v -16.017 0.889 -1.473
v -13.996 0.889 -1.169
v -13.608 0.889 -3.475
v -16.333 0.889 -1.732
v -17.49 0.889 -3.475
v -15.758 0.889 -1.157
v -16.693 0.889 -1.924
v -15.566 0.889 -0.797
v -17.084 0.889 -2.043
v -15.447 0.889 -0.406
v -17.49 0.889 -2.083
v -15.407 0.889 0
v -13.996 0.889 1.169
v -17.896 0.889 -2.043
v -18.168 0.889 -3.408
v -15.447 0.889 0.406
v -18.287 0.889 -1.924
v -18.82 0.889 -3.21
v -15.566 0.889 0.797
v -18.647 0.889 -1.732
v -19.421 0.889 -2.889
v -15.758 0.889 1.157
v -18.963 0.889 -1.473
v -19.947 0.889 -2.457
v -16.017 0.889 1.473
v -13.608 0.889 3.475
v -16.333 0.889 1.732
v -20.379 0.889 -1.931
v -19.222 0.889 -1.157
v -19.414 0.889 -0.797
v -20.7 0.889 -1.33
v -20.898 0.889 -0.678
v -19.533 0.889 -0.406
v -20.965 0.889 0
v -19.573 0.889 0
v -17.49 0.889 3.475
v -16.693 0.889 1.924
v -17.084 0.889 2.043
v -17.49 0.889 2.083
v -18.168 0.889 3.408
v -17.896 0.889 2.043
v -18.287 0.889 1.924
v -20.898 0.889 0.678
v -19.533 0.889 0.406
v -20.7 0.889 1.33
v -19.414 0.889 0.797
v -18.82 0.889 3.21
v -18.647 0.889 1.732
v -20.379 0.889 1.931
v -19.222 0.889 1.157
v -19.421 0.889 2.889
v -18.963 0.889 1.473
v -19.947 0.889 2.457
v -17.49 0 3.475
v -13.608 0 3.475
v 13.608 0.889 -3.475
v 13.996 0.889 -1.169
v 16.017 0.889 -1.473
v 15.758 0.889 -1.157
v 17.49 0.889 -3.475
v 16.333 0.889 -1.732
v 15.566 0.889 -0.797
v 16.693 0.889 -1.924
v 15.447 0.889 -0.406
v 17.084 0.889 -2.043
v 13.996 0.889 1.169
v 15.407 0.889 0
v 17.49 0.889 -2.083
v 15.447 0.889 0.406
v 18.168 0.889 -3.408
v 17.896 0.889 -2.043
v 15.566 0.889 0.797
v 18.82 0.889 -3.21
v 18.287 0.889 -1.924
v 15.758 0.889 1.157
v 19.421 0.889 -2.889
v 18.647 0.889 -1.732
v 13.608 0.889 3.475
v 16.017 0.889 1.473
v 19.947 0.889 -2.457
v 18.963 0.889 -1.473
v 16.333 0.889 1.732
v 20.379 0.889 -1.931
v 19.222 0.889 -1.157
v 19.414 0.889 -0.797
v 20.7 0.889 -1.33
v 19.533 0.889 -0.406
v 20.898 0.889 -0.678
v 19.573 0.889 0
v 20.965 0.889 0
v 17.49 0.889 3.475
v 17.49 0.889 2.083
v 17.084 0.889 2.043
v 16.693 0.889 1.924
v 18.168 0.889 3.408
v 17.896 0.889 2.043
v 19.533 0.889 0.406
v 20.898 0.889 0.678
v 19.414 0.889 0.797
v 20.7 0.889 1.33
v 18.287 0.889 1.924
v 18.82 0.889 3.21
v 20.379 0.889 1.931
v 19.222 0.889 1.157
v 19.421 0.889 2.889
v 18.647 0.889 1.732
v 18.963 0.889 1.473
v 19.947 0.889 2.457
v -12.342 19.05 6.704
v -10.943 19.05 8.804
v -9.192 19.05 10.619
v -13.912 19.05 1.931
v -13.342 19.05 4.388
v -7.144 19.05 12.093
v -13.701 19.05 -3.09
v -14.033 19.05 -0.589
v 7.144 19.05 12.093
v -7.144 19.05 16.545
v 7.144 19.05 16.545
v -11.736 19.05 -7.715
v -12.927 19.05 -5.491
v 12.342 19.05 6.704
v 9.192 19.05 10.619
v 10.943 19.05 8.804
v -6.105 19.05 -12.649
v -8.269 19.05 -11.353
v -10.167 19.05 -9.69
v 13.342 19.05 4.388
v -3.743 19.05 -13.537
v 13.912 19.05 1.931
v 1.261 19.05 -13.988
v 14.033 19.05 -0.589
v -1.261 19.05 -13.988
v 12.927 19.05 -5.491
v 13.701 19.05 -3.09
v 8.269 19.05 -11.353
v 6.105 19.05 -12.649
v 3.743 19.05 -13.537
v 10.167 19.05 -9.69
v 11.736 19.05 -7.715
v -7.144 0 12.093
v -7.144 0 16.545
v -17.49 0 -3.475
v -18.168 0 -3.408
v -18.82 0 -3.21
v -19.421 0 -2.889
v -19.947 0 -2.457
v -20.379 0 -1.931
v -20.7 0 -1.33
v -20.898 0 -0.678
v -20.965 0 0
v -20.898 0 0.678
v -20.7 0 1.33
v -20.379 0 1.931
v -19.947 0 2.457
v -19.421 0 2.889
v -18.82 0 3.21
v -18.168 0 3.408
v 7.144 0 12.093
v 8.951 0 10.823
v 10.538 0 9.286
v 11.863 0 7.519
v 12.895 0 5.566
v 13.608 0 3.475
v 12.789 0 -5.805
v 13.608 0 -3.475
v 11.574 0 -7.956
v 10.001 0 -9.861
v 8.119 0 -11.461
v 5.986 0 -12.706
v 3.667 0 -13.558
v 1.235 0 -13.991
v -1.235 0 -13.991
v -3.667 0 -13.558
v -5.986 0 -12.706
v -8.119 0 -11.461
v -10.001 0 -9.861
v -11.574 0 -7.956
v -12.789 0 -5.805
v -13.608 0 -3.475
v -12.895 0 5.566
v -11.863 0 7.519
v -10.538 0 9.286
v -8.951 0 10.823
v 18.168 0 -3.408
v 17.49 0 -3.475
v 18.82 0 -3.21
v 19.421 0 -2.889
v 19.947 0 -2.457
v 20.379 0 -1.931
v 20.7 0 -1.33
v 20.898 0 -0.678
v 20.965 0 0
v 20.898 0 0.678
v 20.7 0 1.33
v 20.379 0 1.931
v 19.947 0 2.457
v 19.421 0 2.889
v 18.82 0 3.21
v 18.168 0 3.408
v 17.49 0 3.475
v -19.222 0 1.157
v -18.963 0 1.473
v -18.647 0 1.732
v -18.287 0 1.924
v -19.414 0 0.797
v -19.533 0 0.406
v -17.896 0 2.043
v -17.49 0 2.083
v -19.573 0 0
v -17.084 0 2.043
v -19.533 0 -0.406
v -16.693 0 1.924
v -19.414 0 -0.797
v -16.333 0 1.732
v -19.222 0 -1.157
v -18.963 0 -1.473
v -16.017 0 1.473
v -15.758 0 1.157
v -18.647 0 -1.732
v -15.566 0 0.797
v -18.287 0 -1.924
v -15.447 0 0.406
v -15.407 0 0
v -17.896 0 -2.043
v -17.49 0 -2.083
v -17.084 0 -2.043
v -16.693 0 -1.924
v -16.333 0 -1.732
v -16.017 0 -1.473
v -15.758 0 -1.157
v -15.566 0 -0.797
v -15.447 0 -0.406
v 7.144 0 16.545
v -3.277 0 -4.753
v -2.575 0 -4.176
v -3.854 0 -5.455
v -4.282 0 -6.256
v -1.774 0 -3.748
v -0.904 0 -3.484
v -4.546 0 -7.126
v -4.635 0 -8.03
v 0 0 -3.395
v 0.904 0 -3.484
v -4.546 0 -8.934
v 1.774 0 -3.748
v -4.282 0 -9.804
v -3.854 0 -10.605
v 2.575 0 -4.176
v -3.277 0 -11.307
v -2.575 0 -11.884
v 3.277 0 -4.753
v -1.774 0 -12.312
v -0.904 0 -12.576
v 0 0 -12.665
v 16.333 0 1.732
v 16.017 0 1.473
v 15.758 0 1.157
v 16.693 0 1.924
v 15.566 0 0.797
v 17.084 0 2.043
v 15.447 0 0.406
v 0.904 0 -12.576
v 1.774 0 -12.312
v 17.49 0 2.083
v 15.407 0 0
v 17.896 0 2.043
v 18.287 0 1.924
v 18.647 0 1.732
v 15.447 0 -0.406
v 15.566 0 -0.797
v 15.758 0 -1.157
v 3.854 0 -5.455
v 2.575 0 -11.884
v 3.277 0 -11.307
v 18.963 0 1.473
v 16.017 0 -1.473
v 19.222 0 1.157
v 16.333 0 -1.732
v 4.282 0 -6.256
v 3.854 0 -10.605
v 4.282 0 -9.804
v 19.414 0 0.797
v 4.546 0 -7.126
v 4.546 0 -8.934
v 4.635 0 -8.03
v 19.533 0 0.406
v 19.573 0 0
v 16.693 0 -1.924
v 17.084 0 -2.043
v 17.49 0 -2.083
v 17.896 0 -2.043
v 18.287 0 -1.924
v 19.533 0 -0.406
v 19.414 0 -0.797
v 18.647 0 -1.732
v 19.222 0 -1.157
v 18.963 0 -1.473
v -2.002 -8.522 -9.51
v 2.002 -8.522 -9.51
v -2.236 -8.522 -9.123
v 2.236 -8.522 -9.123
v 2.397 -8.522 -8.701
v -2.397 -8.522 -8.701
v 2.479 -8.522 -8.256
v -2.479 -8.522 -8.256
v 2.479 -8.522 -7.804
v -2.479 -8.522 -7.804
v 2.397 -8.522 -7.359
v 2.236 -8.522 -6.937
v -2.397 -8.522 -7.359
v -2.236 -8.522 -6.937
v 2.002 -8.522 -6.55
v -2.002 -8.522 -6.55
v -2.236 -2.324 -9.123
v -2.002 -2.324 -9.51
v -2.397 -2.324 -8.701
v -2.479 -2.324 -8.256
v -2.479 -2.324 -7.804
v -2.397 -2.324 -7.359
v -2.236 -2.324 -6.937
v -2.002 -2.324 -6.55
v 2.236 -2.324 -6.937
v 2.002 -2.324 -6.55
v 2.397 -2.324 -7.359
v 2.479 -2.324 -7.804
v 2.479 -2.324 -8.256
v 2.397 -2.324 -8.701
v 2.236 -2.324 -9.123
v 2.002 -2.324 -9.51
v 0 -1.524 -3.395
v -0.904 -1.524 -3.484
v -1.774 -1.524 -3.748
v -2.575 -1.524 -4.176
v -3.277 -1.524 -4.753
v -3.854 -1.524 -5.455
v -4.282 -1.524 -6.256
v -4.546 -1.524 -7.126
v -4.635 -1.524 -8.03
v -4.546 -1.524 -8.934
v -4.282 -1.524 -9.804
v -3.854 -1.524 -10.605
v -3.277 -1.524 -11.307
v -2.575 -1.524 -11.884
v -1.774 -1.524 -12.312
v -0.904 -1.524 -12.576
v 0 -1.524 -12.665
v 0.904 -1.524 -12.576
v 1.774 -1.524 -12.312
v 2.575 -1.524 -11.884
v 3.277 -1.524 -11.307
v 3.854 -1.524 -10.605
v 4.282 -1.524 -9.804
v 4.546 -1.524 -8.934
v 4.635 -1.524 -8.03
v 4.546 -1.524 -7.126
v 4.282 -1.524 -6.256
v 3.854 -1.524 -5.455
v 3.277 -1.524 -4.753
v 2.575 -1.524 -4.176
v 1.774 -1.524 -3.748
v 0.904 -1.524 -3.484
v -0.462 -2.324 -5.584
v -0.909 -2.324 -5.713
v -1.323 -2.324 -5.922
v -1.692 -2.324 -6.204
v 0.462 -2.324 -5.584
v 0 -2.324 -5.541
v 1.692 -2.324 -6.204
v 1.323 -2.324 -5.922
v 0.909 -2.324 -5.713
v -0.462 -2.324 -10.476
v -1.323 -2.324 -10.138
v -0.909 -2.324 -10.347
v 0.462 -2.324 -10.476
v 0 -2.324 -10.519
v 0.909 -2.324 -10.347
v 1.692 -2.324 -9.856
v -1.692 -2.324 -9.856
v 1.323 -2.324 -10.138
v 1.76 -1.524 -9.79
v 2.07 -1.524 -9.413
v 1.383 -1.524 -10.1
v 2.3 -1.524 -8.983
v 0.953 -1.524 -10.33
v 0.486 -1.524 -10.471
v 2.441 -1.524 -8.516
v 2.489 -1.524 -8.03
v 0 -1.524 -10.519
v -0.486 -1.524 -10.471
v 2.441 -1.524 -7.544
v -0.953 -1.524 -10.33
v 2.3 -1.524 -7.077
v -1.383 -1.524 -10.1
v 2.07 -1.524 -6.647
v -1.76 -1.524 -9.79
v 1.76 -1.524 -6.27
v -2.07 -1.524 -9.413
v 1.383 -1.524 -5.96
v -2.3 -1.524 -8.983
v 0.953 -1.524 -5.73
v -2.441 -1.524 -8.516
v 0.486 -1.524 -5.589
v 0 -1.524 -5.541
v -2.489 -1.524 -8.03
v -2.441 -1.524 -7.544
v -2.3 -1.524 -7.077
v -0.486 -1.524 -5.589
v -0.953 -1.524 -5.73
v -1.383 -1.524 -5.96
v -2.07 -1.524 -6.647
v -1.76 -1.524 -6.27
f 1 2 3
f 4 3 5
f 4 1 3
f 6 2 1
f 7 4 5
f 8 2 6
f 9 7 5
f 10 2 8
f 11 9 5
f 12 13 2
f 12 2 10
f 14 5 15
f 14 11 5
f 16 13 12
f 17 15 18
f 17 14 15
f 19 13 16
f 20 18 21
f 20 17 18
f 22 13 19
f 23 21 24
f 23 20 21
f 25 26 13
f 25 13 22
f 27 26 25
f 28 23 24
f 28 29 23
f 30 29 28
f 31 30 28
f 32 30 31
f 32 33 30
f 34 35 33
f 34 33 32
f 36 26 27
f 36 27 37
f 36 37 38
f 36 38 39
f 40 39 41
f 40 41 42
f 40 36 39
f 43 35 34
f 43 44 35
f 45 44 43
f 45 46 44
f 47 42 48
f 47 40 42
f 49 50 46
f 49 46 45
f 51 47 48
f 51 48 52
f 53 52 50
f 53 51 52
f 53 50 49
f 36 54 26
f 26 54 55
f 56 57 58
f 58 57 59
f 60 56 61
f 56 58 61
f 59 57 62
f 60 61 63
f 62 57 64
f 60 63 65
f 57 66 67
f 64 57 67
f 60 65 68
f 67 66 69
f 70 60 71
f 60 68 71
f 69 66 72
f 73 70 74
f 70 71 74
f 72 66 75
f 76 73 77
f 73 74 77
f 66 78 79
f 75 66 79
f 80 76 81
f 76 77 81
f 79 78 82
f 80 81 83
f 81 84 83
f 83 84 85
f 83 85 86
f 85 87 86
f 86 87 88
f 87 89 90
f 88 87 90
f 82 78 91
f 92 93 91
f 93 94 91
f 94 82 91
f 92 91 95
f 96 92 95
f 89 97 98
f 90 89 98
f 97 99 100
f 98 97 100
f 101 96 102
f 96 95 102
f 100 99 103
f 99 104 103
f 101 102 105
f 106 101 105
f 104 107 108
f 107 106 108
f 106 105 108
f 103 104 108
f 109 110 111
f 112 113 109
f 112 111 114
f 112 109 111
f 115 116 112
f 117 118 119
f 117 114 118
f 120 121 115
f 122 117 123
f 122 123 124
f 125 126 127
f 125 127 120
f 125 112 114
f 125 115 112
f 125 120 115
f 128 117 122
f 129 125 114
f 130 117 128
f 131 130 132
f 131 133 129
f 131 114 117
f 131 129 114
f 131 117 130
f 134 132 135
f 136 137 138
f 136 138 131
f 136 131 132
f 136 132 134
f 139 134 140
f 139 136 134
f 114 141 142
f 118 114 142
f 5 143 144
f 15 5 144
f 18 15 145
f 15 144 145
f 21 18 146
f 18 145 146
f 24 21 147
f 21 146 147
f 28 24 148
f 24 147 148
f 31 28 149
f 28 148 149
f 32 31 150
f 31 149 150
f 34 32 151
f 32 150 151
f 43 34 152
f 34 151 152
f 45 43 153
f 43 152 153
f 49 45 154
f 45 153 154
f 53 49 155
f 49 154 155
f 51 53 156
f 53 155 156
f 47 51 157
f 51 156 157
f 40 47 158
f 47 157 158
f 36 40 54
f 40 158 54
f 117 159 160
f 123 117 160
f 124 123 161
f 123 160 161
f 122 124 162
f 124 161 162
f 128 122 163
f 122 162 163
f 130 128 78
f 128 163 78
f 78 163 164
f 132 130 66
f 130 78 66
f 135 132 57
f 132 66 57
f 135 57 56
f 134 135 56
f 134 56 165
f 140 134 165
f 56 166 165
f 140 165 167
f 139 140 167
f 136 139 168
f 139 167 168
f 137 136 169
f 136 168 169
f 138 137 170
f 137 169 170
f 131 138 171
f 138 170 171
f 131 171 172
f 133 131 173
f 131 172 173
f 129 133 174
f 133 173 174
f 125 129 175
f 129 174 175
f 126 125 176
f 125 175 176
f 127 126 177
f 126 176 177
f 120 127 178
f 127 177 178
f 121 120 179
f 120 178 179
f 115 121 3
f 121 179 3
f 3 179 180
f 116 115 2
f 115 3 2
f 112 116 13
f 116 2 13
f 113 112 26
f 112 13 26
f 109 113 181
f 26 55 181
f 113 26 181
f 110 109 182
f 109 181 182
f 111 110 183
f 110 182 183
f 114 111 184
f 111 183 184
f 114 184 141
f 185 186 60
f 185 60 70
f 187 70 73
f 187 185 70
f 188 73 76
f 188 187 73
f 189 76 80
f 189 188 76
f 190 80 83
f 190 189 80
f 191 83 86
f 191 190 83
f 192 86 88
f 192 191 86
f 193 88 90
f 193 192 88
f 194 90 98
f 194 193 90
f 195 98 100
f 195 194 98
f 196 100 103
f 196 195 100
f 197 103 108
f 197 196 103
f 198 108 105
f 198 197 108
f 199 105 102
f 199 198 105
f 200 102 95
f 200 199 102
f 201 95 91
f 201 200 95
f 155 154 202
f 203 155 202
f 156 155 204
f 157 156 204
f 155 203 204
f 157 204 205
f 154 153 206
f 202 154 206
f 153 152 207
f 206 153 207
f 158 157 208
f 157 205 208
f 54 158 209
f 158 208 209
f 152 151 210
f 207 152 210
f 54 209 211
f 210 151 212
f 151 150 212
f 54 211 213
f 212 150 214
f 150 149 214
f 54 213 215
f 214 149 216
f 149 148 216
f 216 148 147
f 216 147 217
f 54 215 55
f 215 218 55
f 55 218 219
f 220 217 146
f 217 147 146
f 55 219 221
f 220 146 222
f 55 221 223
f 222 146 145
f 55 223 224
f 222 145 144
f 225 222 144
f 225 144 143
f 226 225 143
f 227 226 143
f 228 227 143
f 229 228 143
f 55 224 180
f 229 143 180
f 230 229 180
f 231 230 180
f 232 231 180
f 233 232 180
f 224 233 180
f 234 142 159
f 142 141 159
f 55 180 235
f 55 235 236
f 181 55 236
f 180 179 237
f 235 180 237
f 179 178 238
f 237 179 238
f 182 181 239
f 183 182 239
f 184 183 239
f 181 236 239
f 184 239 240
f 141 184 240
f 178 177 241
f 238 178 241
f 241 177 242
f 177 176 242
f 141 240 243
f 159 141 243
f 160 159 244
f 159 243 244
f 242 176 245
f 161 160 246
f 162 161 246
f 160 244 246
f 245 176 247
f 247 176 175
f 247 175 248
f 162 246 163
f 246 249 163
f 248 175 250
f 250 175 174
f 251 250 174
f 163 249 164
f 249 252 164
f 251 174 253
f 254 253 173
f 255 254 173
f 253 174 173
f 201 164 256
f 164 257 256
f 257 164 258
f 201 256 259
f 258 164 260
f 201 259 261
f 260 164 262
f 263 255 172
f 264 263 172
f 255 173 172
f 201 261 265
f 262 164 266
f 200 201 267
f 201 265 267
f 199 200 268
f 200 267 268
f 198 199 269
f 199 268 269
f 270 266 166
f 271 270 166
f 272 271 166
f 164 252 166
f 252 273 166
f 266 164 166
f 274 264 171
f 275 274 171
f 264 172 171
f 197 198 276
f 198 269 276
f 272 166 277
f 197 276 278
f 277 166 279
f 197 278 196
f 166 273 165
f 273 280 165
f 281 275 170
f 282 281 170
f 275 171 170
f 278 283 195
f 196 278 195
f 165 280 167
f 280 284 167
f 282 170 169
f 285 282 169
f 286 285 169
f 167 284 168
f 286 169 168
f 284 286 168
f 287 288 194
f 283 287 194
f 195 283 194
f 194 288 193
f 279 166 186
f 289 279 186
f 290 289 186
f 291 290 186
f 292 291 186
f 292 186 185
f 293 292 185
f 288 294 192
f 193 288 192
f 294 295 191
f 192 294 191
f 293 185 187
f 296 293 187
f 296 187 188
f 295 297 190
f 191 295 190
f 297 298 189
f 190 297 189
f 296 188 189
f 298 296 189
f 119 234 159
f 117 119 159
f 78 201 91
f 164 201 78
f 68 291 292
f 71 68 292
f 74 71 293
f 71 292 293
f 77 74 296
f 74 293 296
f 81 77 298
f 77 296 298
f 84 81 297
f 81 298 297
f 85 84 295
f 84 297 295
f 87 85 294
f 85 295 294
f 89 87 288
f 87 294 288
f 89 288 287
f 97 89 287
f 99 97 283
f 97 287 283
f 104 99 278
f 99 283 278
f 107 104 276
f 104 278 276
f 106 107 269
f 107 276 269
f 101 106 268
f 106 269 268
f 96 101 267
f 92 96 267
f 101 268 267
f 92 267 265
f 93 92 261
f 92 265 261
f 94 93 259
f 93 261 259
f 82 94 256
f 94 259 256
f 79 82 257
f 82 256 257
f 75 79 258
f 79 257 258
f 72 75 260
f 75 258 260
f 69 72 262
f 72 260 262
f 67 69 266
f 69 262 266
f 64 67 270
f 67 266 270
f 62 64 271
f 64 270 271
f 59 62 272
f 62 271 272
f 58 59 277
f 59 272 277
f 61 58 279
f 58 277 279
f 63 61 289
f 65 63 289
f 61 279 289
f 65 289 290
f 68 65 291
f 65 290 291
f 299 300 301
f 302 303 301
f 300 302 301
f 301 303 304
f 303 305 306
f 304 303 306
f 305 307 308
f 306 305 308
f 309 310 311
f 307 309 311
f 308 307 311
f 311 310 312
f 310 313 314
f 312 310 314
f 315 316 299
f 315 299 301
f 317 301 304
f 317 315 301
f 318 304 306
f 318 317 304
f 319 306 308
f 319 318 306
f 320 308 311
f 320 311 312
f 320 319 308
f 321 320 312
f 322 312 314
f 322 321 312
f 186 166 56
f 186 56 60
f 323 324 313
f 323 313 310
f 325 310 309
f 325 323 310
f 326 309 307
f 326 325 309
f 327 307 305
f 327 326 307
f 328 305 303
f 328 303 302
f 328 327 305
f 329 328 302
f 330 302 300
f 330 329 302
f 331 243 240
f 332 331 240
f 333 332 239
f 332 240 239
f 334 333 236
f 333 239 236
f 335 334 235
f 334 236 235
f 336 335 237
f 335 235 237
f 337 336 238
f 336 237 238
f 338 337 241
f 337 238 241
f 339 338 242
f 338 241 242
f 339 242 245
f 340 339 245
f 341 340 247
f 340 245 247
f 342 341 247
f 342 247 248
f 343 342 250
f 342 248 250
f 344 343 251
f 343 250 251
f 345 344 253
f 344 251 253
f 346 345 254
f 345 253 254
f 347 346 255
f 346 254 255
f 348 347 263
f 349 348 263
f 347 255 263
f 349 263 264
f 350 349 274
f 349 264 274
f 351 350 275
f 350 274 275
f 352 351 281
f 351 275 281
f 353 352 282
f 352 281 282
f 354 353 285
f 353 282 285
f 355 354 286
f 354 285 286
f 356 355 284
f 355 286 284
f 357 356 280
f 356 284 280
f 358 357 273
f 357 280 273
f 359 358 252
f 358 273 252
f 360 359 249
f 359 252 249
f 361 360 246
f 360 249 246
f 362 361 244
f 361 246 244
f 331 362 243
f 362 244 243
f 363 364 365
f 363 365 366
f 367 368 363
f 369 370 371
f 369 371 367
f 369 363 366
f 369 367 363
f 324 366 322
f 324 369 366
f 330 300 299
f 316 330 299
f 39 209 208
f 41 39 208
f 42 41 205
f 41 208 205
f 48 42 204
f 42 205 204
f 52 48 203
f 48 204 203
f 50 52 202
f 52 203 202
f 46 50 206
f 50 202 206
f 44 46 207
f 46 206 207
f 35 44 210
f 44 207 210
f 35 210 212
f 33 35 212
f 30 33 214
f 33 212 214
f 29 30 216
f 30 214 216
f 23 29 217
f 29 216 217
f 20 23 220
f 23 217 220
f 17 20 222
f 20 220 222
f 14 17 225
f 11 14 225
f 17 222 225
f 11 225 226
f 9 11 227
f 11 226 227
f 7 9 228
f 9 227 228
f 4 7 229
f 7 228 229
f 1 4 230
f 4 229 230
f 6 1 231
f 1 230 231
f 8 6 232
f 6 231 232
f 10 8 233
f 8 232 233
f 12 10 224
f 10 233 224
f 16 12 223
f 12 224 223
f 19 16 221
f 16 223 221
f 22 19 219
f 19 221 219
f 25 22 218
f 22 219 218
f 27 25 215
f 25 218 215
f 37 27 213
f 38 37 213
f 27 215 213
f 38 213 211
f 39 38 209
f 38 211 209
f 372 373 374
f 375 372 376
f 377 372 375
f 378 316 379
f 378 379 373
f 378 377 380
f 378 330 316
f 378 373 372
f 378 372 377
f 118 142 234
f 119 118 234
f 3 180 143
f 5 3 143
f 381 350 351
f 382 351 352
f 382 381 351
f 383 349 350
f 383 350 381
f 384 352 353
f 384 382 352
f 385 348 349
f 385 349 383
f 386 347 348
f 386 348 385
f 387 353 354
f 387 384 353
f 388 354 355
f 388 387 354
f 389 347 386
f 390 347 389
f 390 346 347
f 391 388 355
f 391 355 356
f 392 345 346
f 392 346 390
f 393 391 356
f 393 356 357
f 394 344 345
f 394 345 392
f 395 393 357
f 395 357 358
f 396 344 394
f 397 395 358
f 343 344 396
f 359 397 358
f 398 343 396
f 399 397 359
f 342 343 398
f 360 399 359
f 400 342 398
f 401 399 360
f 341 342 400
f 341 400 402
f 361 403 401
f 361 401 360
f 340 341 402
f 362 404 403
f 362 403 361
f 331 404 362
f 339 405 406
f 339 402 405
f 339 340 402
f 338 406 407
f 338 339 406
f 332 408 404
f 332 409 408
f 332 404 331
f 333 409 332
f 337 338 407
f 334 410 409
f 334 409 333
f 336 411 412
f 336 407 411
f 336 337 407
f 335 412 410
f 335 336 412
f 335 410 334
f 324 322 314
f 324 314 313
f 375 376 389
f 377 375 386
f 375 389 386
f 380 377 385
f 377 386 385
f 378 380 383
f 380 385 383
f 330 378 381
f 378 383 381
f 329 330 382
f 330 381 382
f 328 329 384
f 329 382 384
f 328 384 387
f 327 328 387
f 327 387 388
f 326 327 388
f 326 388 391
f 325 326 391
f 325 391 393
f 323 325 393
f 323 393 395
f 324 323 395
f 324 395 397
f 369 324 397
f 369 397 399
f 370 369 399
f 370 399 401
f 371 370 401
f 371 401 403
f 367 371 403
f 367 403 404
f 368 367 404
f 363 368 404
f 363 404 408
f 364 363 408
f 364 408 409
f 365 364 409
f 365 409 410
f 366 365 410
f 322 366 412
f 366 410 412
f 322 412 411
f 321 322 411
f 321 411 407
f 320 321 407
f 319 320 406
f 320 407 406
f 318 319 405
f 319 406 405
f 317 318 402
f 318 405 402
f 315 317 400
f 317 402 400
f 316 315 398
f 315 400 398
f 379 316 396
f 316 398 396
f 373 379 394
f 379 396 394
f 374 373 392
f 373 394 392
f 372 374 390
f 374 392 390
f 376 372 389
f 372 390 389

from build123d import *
from build123d.topology import SkipClean

# Parameters (mm, degrees)
EXTRUDE_1_DEPTH = 19.05
SKETCH_2_R      = 2.0828
EXTRUDE_2_DEPTH = 0.889
SKETCH_3_R      = 4.635
EXTRUDE_3_DEPTH = 1.524
SKETCH_4_R      = 2.4892
EXTRUDE_4_DEPTH = 0.8001
EXTRUDE_5_DEPTH = 6.1976


with BuildPart() as part:
    # 스케치1 → 보스-돌출1 (new body)
    with BuildSketch(Plane(origin=(0, 0, 0), x_dir=(1, 0, 0), z_dir=(0, 1, 0))):
        with BuildLine():
            Line((-7.14375, -16.545), (7.14375, -16.545))
            Line((7.14375, -16.545), (7.14375, -12.092512598))
            ThreePointArc((7.14375, -12.092512598), (0, 14.045), (-7.14375, -12.092512598))
            Line((-7.14375, -12.092512598), (-7.14375, -16.545))
        make_face()
    extrude(amount=EXTRUDE_1_DEPTH)

    # 스케치2 → 보스-돌출2 (add)
    # profile 1 of 2: a face of its own
    with BuildSketch(Plane.XZ):
        with BuildLine():
            Line((-17.49, 3.475), (-13.608320984, 3.475))
            ThreePointArc((-13.608320984, 3.475), (-14.045, 0), (-13.608320984, -3.475))
            Line((-13.608320984, -3.475), (-17.49, -3.475))
            ThreePointArc((-17.49, -3.475), (-20.965, 0), (-17.49, 3.475))
        make_face()
        with Locations(Location((-17.49, 0, 0), (0, 0, 90))):
            Circle(SKETCH_2_R, mode=Mode.SUBTRACT)
    # profile 2 of 2: a face of its own
    with BuildSketch(Plane.XZ):
        with BuildLine():
            Line((17.49, 3.475), (13.608320984, 3.475))
            ThreePointArc((13.608320984, 3.475), (14.045, 0), (13.608320984, -3.475))
            Line((13.608320984, -3.475), (17.49, -3.475))
            ThreePointArc((17.49, -3.475), (20.965, 0), (17.49, 3.475))
        make_face()
        with Locations(Location((17.49, 0, 0), (0, 0, 270))):
            Circle(SKETCH_2_R, mode=Mode.SUBTRACT)
    extrude(amount=-EXTRUDE_2_DEPTH)

    # 스케치3 → 보스-돌출3 (add)
    with BuildSketch(Plane.XZ):
        with Locations(Location((0, -8.03, 0), (0, 0, 90))):
            Circle(SKETCH_3_R)
    extrude(amount=EXTRUDE_3_DEPTH)

    # 스케치4 → 보스-돌출4 (add)
    with BuildSketch(Plane.XZ.offset(1.524)):
        with Locations(Location((0, -8.03, 0), (0, 0, 270))):
            Circle(SKETCH_4_R)
    extrude(amount=EXTRUDE_4_DEPTH)

    # 스케치5 → 보스-돌출5 (add)
    with SkipClean():  # the faces are left unmerged after this step: merging them gives an invalid solid
        with BuildSketch(Plane.XZ.offset(2.3241)):
            with BuildLine():
                Line((2.001761334, -9.50955), (-2.001761334, -9.50955))
                ThreePointArc((-2.001761334, -9.50955), (-2.4892, -8.03), (-2.001761334, -6.55045))
                Line((-2.001761334, -6.55045), (2.001761334, -6.55045))
                ThreePointArc((2.001761334, -6.55045), (2.4892, -8.03), (2.001761334, -9.50955))
            make_face()
        extrude(amount=EXTRUDE_5_DEPTH)


solid = part.part
